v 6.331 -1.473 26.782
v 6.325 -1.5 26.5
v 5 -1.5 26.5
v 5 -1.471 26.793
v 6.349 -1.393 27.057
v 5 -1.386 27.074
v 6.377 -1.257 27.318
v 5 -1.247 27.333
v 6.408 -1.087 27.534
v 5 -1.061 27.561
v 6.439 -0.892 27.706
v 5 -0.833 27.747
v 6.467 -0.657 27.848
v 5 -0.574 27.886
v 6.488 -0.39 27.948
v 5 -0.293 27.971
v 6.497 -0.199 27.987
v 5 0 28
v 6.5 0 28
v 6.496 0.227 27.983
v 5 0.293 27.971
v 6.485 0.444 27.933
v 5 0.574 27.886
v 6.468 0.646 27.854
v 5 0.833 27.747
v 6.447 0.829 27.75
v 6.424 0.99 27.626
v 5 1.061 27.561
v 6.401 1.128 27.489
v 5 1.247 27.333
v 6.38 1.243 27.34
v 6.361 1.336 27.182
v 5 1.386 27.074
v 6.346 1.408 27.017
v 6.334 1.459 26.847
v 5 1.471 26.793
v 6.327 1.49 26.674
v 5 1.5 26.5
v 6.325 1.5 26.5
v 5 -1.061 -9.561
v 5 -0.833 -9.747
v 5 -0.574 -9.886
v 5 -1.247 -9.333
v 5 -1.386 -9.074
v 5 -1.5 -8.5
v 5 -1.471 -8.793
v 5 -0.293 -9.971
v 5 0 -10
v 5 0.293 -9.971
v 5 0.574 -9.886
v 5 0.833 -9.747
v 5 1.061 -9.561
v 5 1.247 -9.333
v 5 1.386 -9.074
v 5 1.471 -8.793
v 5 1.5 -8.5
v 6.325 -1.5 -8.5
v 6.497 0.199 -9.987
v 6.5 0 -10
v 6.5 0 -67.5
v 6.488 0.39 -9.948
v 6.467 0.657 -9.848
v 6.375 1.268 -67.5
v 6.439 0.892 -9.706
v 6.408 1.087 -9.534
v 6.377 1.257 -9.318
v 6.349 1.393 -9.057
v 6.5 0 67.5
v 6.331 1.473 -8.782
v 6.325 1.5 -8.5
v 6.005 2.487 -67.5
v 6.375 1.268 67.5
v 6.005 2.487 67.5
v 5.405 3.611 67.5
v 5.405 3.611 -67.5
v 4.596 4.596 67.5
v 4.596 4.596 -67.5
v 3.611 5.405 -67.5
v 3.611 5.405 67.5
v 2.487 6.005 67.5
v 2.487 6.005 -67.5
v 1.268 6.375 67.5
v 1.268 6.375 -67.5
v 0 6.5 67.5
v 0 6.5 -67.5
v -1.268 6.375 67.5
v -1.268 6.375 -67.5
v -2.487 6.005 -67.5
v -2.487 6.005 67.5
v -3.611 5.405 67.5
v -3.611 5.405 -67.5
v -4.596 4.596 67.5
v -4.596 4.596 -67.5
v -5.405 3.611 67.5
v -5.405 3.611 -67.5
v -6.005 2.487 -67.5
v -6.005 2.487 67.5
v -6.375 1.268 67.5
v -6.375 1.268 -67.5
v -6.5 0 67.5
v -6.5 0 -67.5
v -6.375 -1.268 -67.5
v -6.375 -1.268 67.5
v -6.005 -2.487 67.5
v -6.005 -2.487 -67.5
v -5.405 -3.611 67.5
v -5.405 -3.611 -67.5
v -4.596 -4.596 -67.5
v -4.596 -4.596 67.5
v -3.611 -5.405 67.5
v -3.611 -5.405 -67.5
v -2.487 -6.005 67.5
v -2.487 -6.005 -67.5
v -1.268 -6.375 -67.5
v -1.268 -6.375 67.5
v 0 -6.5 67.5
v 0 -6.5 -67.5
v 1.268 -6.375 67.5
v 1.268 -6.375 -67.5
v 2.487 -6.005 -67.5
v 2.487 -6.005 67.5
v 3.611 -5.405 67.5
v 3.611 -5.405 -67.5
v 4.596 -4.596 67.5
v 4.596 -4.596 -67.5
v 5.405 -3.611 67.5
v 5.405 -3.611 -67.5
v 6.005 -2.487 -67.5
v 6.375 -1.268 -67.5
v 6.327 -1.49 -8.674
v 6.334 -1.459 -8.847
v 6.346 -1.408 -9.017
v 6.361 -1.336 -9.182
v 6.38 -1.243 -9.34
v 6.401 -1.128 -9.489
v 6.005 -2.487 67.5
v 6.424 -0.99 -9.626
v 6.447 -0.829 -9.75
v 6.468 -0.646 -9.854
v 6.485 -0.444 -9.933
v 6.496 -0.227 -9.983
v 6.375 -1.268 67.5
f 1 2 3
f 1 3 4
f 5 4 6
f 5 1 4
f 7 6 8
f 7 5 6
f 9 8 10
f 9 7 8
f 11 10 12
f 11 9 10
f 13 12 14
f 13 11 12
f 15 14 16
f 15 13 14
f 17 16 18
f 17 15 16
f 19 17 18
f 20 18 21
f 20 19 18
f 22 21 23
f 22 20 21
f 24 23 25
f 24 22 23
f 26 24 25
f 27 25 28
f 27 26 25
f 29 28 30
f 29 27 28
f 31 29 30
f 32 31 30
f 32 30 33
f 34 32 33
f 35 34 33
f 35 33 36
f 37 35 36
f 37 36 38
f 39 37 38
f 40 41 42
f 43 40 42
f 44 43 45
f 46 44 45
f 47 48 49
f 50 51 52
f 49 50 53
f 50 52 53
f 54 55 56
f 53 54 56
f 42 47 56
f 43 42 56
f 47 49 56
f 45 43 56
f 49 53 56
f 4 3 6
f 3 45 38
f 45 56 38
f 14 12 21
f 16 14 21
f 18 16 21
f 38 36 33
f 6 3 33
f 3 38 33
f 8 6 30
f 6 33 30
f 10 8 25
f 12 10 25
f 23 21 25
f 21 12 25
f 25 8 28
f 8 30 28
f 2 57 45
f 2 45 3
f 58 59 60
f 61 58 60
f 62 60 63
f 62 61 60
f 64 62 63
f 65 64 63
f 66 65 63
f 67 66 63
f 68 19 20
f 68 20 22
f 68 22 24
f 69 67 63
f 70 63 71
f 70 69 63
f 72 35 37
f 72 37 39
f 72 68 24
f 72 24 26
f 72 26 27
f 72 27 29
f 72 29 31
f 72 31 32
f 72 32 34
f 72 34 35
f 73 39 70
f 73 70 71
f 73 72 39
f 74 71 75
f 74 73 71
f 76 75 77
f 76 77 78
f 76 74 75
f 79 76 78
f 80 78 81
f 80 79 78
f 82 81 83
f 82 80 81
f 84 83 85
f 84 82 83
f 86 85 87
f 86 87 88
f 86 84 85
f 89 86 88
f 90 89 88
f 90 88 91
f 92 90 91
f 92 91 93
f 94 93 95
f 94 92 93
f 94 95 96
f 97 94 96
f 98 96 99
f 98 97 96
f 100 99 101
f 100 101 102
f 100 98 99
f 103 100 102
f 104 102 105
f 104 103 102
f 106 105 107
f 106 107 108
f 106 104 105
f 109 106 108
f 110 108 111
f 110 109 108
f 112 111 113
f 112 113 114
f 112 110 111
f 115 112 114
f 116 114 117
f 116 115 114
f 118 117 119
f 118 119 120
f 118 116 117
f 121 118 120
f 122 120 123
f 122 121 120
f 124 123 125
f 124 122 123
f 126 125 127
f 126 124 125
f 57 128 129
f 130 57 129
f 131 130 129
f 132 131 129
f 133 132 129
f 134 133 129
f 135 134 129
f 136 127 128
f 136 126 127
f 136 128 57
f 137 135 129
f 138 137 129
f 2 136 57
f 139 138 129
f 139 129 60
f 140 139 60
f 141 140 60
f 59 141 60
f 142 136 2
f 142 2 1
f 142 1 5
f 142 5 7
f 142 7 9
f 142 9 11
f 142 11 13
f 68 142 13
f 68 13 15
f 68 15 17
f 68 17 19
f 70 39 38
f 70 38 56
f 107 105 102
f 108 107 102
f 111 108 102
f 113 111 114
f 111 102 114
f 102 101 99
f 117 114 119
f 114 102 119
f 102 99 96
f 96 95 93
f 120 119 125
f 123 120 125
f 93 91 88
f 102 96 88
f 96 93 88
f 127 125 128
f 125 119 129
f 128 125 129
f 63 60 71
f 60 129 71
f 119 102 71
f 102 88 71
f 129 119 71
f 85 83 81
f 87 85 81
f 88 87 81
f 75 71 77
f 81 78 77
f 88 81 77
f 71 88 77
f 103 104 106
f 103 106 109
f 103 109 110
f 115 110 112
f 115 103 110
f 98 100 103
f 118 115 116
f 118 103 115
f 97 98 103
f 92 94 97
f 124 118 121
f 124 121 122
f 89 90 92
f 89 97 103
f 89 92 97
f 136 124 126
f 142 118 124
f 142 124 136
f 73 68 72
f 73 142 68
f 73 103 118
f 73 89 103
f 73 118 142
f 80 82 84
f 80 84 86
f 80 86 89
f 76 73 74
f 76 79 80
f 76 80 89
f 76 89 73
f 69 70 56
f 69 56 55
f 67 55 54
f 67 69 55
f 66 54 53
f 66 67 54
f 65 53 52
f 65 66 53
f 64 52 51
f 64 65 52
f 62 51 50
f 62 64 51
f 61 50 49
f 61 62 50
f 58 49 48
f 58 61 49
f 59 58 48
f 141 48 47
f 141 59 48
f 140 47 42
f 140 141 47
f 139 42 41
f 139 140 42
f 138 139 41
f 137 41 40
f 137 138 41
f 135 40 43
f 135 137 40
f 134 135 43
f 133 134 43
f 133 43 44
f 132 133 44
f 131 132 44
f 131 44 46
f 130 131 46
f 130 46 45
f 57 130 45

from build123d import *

# Parameters (mm, degrees)
SKETCH1_R           = 6.5
BOSS_EXTRUDE1_DEPTH = 67.5
CUT_EXTRUDE1_START  = 6.5
CUT_EXTRUDE1_DEPTH  = 1.5


with BuildPart() as part:
    # Sketch1 → Boss-Extrude1 (new, symmetric)
    with BuildSketch(Plane.XY):
        Circle(SKETCH1_R)
    extrude(amount=BOSS_EXTRUDE1_DEPTH, both=True)

    # Sketch2 → Cut-Extrude1 (cut)
    with BuildSketch(Plane(origin=(0, 0, 0), x_dir=(0, 0, -1), z_dir=(1, 0, 0)).offset(CUT_EXTRUDE1_START)):
        with BuildLine():
            Line((-26.5, 1.5), (8.5, 1.5))
            ThreePointArc((8.5, 1.5), (10, 0), (8.5, -1.5))
            Line((8.5, -1.5), (-26.5, -1.5))
            ThreePointArc((-26.5, -1.5), (-28, 0), (-26.5, 1.5))
        make_face()
    extrude(amount=-CUT_EXTRUDE1_DEPTH, mode=Mode.SUBTRACT)


solid = part.part
